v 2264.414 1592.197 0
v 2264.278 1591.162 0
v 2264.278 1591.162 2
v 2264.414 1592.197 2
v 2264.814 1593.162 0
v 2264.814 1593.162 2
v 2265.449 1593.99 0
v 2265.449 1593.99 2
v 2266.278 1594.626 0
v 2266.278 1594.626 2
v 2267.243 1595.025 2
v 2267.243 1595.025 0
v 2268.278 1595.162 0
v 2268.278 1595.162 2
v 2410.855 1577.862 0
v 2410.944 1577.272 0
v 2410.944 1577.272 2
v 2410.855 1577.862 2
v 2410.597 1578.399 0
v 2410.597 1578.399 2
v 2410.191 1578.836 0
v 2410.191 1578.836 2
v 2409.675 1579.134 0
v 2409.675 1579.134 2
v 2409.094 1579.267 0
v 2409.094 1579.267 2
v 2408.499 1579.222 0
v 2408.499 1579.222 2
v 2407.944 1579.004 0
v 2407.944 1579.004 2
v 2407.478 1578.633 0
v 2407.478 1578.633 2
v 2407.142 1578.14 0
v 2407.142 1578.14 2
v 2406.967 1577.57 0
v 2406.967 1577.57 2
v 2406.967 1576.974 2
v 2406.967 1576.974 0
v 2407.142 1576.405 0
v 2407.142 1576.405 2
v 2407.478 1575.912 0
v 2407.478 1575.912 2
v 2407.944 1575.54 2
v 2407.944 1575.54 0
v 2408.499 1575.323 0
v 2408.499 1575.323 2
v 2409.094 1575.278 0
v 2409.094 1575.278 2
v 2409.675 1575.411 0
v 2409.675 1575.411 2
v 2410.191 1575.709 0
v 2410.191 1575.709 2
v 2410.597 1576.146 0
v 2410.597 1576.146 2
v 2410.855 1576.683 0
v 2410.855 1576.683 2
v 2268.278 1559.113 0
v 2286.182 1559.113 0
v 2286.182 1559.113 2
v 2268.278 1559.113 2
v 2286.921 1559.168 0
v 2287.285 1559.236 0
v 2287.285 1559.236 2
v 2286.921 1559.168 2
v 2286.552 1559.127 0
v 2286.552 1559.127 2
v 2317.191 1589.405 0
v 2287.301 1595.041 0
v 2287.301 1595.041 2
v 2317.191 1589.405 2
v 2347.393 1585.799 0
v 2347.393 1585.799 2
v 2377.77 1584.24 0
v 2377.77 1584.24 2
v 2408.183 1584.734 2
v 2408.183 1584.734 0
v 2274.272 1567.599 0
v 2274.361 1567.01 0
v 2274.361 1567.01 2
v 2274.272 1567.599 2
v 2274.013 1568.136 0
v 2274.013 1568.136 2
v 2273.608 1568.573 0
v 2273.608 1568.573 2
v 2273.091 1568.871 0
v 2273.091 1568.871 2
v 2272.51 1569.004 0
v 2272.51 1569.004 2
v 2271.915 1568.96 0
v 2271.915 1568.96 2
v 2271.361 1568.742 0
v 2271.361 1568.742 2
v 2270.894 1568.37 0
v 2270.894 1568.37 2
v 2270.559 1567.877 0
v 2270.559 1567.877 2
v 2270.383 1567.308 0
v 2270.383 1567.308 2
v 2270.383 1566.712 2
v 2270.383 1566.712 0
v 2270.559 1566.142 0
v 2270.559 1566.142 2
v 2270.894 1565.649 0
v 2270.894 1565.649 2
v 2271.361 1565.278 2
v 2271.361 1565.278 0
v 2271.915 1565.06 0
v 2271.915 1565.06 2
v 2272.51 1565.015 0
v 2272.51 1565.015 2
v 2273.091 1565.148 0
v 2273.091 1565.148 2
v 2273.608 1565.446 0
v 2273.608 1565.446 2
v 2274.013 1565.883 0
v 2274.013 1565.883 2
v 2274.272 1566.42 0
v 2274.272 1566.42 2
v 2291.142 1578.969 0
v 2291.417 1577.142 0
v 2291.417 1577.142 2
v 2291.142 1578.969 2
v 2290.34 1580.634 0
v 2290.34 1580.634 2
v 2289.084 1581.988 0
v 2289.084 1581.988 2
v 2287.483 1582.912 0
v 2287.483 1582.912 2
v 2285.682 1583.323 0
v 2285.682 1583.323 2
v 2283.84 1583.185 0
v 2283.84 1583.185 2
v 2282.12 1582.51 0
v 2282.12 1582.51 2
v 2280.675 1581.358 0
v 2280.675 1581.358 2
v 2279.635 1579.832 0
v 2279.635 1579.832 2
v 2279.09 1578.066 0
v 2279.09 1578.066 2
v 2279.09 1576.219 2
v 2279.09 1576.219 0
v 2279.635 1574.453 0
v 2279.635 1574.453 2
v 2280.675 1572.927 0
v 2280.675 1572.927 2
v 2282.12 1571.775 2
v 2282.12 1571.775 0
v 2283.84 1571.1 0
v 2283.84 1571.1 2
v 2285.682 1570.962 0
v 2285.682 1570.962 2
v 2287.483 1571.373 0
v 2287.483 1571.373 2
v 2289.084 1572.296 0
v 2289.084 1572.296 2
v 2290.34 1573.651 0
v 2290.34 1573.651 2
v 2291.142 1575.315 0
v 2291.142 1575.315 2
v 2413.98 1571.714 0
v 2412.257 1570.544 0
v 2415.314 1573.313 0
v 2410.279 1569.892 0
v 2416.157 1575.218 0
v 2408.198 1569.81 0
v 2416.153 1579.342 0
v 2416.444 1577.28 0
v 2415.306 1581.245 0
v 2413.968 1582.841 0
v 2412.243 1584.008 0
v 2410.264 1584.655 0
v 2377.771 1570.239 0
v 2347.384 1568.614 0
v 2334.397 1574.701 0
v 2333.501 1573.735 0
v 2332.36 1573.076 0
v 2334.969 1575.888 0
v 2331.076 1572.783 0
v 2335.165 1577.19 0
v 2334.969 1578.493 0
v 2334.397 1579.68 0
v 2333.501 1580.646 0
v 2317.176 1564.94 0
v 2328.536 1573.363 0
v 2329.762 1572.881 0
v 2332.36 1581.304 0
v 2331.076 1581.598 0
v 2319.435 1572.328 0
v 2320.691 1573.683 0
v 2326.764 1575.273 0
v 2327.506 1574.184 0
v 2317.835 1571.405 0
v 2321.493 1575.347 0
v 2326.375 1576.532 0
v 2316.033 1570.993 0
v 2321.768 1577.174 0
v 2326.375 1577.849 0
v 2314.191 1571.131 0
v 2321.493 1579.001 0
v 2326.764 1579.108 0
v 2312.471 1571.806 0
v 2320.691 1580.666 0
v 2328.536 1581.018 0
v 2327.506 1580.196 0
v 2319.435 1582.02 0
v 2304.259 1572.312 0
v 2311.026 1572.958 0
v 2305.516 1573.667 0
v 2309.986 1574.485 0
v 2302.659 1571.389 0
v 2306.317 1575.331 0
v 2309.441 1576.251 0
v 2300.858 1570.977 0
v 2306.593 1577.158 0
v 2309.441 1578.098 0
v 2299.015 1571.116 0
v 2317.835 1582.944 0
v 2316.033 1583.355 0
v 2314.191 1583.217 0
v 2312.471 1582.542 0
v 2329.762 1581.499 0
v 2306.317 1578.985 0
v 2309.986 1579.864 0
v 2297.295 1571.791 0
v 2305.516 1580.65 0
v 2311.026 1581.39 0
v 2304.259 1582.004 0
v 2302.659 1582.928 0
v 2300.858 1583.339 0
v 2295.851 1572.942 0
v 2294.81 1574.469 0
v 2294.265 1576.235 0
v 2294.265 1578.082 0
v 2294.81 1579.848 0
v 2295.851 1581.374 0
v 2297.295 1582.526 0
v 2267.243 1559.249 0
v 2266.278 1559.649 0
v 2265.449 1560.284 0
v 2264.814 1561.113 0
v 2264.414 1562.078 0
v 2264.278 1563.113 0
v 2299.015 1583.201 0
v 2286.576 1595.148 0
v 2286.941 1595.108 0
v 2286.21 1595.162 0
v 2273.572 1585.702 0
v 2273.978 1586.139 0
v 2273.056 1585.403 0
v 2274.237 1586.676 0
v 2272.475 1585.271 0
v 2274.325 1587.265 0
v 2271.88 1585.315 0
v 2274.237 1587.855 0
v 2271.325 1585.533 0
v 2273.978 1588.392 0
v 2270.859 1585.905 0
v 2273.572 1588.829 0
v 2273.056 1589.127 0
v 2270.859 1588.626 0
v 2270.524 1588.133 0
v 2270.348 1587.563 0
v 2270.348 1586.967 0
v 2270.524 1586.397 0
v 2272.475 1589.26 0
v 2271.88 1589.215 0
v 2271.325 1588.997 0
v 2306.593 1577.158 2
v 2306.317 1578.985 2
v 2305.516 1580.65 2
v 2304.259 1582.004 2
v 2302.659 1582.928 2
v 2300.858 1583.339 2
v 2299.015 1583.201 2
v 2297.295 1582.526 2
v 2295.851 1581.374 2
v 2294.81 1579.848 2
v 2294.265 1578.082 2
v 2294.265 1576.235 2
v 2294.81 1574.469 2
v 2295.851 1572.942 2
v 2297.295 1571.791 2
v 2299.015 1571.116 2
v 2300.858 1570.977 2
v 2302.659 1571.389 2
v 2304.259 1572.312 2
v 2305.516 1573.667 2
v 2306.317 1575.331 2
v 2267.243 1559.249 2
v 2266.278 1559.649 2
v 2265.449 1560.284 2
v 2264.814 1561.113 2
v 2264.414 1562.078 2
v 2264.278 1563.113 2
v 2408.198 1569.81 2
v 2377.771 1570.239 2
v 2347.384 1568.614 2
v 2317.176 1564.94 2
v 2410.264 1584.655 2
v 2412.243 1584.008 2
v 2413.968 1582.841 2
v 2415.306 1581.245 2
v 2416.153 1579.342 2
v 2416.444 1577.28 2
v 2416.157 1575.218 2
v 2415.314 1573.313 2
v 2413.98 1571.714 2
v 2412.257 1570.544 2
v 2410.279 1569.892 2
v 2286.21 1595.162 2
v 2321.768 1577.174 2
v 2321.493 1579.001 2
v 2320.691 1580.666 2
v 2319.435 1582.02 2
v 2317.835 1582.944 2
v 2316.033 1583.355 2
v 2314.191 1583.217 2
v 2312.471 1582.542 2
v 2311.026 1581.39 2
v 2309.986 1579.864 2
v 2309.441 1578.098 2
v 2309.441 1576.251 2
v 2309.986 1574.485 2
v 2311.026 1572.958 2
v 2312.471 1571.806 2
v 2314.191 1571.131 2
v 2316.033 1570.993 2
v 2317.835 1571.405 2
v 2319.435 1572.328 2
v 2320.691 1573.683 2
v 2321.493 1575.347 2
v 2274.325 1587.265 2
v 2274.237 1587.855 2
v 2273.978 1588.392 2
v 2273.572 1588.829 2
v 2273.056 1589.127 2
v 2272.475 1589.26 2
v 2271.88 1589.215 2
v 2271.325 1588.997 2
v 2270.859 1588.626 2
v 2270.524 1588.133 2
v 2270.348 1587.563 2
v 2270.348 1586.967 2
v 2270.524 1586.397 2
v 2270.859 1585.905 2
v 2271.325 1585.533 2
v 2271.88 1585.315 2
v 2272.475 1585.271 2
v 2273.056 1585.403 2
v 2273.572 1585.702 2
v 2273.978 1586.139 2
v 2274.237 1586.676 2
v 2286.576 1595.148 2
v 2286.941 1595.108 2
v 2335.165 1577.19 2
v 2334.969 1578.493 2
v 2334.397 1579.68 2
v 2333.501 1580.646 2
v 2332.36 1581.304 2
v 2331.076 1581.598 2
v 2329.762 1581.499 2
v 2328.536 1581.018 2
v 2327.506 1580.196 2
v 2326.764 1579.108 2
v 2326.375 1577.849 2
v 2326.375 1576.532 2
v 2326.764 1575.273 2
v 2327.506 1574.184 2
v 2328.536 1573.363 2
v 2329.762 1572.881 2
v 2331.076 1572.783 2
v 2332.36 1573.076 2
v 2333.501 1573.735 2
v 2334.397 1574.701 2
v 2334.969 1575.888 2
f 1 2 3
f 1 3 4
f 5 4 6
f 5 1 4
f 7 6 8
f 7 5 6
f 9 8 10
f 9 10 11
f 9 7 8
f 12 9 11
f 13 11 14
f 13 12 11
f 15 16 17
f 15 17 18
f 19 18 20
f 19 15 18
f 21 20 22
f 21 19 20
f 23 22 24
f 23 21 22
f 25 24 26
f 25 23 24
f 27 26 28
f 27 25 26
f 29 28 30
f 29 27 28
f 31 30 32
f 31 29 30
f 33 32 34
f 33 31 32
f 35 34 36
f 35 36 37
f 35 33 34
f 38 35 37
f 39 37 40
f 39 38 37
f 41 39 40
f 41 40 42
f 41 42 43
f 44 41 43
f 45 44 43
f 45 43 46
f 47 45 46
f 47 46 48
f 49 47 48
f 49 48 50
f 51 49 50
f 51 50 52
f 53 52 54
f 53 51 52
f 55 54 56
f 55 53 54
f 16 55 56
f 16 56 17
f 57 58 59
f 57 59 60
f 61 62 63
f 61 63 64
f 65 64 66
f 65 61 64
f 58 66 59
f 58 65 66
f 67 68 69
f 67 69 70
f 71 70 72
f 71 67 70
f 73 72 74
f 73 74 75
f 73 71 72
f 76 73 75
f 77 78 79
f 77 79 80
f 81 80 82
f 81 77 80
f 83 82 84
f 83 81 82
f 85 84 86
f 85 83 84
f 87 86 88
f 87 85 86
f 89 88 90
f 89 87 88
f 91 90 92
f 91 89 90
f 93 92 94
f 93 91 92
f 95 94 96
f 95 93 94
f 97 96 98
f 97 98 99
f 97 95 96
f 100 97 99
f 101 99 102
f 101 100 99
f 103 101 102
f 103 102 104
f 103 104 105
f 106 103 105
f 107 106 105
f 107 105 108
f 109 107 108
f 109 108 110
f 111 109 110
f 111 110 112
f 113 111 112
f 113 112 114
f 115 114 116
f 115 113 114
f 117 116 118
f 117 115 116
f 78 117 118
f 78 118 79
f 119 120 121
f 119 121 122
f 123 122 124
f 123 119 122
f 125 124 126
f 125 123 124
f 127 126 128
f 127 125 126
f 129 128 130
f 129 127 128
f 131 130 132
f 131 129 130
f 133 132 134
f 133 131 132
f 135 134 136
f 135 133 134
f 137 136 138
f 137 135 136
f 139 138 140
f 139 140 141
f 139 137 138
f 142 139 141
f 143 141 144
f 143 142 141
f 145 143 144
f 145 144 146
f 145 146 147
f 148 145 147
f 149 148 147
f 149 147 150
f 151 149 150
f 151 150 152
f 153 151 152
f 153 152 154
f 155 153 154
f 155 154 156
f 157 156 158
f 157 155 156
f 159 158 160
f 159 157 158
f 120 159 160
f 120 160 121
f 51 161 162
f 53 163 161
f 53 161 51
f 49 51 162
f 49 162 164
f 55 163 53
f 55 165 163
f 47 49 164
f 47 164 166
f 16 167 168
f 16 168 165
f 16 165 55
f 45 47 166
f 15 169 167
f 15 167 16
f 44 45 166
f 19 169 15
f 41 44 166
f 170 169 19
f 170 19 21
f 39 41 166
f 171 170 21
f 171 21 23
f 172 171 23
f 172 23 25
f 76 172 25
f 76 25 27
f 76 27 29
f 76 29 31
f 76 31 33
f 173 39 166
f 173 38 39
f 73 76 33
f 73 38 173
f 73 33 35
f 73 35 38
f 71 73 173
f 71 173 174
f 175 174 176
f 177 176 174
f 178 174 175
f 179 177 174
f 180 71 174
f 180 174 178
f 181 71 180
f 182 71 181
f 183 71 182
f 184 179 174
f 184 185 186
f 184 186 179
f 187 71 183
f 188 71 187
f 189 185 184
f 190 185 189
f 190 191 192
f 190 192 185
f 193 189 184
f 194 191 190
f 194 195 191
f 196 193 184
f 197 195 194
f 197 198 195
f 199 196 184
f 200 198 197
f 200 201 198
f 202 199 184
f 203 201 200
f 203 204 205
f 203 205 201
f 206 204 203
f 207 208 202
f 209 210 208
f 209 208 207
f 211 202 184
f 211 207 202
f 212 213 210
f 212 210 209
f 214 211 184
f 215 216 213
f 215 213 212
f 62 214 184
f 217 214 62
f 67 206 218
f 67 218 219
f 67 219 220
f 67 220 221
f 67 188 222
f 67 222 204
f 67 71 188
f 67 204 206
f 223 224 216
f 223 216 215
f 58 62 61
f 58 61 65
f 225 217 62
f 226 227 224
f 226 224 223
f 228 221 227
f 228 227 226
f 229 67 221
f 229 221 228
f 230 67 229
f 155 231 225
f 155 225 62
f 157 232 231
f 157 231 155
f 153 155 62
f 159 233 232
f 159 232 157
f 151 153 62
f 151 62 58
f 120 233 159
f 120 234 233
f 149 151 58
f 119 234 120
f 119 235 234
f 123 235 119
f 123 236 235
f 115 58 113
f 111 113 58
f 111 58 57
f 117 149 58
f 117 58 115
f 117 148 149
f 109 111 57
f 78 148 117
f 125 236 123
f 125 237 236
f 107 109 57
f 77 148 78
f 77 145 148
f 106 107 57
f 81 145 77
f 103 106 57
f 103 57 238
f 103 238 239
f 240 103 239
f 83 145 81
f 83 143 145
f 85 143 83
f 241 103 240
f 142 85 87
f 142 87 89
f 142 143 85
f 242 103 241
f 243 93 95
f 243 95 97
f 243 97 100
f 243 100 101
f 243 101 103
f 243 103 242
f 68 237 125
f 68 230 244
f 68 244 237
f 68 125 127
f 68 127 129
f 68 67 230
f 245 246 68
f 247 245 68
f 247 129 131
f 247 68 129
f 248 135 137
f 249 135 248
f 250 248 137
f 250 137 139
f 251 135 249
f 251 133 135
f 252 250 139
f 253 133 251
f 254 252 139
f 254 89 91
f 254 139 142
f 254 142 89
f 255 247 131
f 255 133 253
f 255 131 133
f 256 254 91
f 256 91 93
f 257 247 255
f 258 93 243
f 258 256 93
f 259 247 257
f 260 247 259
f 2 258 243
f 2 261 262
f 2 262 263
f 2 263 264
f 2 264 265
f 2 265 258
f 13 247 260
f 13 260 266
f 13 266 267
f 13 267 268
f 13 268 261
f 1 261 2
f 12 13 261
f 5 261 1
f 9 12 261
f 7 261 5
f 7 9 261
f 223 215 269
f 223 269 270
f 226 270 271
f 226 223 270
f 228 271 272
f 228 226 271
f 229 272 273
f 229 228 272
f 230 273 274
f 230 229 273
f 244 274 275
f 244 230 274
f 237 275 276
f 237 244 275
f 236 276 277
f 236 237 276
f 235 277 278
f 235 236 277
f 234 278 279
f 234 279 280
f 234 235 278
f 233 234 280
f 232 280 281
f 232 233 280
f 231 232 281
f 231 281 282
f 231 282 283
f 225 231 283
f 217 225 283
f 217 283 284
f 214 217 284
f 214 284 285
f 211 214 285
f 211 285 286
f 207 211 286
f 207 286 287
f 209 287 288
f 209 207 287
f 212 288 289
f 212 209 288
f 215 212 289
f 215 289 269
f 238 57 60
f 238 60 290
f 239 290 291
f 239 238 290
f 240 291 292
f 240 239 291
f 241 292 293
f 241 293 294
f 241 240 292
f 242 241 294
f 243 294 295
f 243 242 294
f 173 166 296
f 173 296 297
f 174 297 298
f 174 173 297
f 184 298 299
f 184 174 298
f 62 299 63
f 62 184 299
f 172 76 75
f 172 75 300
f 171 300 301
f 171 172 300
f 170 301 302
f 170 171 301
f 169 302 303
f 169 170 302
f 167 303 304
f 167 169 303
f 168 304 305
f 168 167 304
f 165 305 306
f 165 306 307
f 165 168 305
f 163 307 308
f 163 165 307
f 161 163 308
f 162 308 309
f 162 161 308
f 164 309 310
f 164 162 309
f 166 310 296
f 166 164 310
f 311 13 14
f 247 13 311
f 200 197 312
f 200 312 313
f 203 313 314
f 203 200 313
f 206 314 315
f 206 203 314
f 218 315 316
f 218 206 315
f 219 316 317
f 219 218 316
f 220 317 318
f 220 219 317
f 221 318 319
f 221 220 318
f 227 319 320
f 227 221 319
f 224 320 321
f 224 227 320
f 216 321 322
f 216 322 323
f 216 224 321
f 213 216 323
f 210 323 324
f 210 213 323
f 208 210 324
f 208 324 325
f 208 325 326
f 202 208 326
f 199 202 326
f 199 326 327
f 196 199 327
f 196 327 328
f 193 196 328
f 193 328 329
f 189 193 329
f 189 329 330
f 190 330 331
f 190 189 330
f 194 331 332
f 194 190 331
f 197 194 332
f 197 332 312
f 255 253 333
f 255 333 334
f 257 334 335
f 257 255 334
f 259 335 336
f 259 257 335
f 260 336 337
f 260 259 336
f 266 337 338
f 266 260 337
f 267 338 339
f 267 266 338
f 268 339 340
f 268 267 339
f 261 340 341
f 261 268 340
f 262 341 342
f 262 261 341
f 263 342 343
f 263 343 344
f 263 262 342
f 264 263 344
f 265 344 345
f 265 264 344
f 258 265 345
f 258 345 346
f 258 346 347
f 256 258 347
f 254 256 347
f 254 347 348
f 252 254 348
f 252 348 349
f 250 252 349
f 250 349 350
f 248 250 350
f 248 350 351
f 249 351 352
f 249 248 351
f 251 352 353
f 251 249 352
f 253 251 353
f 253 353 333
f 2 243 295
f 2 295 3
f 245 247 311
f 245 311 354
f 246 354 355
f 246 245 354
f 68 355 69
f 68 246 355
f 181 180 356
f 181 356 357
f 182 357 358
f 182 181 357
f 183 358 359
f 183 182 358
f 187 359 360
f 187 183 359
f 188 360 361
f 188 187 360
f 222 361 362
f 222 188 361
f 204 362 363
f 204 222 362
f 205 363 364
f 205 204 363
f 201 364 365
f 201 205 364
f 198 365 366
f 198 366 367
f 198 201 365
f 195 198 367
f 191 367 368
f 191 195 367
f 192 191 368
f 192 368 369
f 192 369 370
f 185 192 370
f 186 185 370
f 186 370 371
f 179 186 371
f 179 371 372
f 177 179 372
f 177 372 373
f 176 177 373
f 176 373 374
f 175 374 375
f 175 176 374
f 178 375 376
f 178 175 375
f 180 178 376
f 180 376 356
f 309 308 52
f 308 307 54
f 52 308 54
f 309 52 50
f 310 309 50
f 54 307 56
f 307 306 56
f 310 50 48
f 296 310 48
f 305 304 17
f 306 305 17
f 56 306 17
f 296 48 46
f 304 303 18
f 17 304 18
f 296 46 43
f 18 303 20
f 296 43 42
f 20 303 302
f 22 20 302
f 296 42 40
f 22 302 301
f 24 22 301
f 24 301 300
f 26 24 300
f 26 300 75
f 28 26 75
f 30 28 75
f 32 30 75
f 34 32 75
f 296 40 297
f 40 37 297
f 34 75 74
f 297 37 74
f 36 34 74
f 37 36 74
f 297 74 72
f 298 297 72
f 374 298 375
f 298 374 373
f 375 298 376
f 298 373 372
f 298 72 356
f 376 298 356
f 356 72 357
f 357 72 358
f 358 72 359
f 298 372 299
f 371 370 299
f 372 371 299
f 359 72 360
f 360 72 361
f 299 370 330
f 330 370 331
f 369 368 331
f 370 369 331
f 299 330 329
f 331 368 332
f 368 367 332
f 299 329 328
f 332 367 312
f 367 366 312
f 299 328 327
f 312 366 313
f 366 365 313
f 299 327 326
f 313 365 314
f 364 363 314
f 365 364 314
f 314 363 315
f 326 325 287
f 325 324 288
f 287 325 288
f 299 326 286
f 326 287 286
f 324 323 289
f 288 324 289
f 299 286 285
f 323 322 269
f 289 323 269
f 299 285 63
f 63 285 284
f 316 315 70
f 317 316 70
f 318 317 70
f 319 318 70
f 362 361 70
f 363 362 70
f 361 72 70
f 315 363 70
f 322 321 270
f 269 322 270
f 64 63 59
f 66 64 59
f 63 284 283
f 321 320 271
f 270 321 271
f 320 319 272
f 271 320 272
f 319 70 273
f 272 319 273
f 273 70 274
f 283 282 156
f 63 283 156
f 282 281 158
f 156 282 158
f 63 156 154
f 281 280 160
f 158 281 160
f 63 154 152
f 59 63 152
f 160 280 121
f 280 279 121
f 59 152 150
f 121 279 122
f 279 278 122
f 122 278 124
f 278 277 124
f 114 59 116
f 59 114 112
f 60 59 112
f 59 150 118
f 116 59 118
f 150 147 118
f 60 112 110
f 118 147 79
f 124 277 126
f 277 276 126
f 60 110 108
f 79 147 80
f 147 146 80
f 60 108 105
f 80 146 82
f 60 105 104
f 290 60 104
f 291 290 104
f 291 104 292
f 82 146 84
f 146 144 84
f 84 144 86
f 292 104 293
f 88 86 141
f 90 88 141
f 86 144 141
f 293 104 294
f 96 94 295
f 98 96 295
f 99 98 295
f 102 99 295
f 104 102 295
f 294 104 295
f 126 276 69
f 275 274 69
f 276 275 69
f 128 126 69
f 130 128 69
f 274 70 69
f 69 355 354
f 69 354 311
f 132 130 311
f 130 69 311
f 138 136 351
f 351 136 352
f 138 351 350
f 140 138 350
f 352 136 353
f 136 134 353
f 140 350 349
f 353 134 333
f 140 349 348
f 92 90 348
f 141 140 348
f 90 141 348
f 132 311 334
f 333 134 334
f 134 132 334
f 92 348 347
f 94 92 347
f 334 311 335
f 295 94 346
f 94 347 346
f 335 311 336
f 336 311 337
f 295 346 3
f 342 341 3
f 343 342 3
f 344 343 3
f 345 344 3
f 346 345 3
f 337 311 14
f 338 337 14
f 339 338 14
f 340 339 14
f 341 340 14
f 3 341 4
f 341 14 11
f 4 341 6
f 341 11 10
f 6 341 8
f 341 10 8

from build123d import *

# Parameters (mm, degrees)
CROQUIS1_R              = 2
CROQUIS1_R_2            = 6.198274882
CROQUIS1_R_3            = 4.419717803
SALIENTE_EXTRUIR1_DEPTH = 2


with BuildPart() as part:
    # Croquis1 → Saliente-Extruir1 (new body)
    with BuildSketch(Plane.XY):
        with BuildLine():
            Line((2268.277850574, 1595.161717739), (2286.209587358, 1595.161717739))
            ThreePointArc((2286.209587358, 1595.161717739), (2286.758807426, 1595.131461929), (2287.301380655, 1595.041060665))
            ThreePointArc((2287.301380655, 1595.041060665), (2347.39348888, 1585.799291159), (2408.182765081, 1584.733611347))
            ThreePointArc((2408.182765081, 1584.733611347), (2416.444223404, 1577.280241595), (2408.198435589, 1569.809538977))
            ThreePointArc((2408.198435589, 1569.809538977), (2347.38385613, 1568.613783021), (2287.284769189, 1559.236008449))
            ThreePointArc((2287.284769189, 1559.236008449), (2286.73687453, 1559.143781296), (2286.18213001, 1559.112911855))
            Line((2286.18213001, 1559.112911855), (2268.277850574, 1559.112911855))
            ThreePointArc((2268.277850574, 1559.112911855), (2265.449423449, 1560.284484731), (2264.277850574, 1563.112911855))
            Line((2264.277850574, 1563.112911855), (2264.277850574, 1591.161717739))
            ThreePointArc((2264.277850574, 1591.161717739), (2265.449423449, 1593.990144863), (2268.277850574, 1595.161717739))
        make_face()
        with Locations((2272.325487006, 1587.265174947)):
            Circle(CROQUIS1_R, mode=Mode.SUBTRACT)
        with Locations((2408.944227539, 1577.272366482)):
            Circle(CROQUIS1_R, mode=Mode.SUBTRACT)
        with Locations((2272.360522717, 1567.00968004)):
            Circle(CROQUIS1_R, mode=Mode.SUBTRACT)
        with Locations((2285.218970732, 1577.142453031)):
            Circle(CROQUIS1_R_2, mode=Mode.SUBTRACT)
        with Locations((2300.394517149, 1577.158387592)):
            Circle(CROQUIS1_R_2, mode=Mode.SUBTRACT)
        with Locations((2315.570063567, 1577.174322153)):
            Circle(CROQUIS1_R_2, mode=Mode.SUBTRACT)
        with Locations((2330.745609984, 1577.190256713)):
            Circle(CROQUIS1_R_3, mode=Mode.SUBTRACT)
    extrude(amount=SALIENTE_EXTRUIR1_DEPTH)


solid = part.part
